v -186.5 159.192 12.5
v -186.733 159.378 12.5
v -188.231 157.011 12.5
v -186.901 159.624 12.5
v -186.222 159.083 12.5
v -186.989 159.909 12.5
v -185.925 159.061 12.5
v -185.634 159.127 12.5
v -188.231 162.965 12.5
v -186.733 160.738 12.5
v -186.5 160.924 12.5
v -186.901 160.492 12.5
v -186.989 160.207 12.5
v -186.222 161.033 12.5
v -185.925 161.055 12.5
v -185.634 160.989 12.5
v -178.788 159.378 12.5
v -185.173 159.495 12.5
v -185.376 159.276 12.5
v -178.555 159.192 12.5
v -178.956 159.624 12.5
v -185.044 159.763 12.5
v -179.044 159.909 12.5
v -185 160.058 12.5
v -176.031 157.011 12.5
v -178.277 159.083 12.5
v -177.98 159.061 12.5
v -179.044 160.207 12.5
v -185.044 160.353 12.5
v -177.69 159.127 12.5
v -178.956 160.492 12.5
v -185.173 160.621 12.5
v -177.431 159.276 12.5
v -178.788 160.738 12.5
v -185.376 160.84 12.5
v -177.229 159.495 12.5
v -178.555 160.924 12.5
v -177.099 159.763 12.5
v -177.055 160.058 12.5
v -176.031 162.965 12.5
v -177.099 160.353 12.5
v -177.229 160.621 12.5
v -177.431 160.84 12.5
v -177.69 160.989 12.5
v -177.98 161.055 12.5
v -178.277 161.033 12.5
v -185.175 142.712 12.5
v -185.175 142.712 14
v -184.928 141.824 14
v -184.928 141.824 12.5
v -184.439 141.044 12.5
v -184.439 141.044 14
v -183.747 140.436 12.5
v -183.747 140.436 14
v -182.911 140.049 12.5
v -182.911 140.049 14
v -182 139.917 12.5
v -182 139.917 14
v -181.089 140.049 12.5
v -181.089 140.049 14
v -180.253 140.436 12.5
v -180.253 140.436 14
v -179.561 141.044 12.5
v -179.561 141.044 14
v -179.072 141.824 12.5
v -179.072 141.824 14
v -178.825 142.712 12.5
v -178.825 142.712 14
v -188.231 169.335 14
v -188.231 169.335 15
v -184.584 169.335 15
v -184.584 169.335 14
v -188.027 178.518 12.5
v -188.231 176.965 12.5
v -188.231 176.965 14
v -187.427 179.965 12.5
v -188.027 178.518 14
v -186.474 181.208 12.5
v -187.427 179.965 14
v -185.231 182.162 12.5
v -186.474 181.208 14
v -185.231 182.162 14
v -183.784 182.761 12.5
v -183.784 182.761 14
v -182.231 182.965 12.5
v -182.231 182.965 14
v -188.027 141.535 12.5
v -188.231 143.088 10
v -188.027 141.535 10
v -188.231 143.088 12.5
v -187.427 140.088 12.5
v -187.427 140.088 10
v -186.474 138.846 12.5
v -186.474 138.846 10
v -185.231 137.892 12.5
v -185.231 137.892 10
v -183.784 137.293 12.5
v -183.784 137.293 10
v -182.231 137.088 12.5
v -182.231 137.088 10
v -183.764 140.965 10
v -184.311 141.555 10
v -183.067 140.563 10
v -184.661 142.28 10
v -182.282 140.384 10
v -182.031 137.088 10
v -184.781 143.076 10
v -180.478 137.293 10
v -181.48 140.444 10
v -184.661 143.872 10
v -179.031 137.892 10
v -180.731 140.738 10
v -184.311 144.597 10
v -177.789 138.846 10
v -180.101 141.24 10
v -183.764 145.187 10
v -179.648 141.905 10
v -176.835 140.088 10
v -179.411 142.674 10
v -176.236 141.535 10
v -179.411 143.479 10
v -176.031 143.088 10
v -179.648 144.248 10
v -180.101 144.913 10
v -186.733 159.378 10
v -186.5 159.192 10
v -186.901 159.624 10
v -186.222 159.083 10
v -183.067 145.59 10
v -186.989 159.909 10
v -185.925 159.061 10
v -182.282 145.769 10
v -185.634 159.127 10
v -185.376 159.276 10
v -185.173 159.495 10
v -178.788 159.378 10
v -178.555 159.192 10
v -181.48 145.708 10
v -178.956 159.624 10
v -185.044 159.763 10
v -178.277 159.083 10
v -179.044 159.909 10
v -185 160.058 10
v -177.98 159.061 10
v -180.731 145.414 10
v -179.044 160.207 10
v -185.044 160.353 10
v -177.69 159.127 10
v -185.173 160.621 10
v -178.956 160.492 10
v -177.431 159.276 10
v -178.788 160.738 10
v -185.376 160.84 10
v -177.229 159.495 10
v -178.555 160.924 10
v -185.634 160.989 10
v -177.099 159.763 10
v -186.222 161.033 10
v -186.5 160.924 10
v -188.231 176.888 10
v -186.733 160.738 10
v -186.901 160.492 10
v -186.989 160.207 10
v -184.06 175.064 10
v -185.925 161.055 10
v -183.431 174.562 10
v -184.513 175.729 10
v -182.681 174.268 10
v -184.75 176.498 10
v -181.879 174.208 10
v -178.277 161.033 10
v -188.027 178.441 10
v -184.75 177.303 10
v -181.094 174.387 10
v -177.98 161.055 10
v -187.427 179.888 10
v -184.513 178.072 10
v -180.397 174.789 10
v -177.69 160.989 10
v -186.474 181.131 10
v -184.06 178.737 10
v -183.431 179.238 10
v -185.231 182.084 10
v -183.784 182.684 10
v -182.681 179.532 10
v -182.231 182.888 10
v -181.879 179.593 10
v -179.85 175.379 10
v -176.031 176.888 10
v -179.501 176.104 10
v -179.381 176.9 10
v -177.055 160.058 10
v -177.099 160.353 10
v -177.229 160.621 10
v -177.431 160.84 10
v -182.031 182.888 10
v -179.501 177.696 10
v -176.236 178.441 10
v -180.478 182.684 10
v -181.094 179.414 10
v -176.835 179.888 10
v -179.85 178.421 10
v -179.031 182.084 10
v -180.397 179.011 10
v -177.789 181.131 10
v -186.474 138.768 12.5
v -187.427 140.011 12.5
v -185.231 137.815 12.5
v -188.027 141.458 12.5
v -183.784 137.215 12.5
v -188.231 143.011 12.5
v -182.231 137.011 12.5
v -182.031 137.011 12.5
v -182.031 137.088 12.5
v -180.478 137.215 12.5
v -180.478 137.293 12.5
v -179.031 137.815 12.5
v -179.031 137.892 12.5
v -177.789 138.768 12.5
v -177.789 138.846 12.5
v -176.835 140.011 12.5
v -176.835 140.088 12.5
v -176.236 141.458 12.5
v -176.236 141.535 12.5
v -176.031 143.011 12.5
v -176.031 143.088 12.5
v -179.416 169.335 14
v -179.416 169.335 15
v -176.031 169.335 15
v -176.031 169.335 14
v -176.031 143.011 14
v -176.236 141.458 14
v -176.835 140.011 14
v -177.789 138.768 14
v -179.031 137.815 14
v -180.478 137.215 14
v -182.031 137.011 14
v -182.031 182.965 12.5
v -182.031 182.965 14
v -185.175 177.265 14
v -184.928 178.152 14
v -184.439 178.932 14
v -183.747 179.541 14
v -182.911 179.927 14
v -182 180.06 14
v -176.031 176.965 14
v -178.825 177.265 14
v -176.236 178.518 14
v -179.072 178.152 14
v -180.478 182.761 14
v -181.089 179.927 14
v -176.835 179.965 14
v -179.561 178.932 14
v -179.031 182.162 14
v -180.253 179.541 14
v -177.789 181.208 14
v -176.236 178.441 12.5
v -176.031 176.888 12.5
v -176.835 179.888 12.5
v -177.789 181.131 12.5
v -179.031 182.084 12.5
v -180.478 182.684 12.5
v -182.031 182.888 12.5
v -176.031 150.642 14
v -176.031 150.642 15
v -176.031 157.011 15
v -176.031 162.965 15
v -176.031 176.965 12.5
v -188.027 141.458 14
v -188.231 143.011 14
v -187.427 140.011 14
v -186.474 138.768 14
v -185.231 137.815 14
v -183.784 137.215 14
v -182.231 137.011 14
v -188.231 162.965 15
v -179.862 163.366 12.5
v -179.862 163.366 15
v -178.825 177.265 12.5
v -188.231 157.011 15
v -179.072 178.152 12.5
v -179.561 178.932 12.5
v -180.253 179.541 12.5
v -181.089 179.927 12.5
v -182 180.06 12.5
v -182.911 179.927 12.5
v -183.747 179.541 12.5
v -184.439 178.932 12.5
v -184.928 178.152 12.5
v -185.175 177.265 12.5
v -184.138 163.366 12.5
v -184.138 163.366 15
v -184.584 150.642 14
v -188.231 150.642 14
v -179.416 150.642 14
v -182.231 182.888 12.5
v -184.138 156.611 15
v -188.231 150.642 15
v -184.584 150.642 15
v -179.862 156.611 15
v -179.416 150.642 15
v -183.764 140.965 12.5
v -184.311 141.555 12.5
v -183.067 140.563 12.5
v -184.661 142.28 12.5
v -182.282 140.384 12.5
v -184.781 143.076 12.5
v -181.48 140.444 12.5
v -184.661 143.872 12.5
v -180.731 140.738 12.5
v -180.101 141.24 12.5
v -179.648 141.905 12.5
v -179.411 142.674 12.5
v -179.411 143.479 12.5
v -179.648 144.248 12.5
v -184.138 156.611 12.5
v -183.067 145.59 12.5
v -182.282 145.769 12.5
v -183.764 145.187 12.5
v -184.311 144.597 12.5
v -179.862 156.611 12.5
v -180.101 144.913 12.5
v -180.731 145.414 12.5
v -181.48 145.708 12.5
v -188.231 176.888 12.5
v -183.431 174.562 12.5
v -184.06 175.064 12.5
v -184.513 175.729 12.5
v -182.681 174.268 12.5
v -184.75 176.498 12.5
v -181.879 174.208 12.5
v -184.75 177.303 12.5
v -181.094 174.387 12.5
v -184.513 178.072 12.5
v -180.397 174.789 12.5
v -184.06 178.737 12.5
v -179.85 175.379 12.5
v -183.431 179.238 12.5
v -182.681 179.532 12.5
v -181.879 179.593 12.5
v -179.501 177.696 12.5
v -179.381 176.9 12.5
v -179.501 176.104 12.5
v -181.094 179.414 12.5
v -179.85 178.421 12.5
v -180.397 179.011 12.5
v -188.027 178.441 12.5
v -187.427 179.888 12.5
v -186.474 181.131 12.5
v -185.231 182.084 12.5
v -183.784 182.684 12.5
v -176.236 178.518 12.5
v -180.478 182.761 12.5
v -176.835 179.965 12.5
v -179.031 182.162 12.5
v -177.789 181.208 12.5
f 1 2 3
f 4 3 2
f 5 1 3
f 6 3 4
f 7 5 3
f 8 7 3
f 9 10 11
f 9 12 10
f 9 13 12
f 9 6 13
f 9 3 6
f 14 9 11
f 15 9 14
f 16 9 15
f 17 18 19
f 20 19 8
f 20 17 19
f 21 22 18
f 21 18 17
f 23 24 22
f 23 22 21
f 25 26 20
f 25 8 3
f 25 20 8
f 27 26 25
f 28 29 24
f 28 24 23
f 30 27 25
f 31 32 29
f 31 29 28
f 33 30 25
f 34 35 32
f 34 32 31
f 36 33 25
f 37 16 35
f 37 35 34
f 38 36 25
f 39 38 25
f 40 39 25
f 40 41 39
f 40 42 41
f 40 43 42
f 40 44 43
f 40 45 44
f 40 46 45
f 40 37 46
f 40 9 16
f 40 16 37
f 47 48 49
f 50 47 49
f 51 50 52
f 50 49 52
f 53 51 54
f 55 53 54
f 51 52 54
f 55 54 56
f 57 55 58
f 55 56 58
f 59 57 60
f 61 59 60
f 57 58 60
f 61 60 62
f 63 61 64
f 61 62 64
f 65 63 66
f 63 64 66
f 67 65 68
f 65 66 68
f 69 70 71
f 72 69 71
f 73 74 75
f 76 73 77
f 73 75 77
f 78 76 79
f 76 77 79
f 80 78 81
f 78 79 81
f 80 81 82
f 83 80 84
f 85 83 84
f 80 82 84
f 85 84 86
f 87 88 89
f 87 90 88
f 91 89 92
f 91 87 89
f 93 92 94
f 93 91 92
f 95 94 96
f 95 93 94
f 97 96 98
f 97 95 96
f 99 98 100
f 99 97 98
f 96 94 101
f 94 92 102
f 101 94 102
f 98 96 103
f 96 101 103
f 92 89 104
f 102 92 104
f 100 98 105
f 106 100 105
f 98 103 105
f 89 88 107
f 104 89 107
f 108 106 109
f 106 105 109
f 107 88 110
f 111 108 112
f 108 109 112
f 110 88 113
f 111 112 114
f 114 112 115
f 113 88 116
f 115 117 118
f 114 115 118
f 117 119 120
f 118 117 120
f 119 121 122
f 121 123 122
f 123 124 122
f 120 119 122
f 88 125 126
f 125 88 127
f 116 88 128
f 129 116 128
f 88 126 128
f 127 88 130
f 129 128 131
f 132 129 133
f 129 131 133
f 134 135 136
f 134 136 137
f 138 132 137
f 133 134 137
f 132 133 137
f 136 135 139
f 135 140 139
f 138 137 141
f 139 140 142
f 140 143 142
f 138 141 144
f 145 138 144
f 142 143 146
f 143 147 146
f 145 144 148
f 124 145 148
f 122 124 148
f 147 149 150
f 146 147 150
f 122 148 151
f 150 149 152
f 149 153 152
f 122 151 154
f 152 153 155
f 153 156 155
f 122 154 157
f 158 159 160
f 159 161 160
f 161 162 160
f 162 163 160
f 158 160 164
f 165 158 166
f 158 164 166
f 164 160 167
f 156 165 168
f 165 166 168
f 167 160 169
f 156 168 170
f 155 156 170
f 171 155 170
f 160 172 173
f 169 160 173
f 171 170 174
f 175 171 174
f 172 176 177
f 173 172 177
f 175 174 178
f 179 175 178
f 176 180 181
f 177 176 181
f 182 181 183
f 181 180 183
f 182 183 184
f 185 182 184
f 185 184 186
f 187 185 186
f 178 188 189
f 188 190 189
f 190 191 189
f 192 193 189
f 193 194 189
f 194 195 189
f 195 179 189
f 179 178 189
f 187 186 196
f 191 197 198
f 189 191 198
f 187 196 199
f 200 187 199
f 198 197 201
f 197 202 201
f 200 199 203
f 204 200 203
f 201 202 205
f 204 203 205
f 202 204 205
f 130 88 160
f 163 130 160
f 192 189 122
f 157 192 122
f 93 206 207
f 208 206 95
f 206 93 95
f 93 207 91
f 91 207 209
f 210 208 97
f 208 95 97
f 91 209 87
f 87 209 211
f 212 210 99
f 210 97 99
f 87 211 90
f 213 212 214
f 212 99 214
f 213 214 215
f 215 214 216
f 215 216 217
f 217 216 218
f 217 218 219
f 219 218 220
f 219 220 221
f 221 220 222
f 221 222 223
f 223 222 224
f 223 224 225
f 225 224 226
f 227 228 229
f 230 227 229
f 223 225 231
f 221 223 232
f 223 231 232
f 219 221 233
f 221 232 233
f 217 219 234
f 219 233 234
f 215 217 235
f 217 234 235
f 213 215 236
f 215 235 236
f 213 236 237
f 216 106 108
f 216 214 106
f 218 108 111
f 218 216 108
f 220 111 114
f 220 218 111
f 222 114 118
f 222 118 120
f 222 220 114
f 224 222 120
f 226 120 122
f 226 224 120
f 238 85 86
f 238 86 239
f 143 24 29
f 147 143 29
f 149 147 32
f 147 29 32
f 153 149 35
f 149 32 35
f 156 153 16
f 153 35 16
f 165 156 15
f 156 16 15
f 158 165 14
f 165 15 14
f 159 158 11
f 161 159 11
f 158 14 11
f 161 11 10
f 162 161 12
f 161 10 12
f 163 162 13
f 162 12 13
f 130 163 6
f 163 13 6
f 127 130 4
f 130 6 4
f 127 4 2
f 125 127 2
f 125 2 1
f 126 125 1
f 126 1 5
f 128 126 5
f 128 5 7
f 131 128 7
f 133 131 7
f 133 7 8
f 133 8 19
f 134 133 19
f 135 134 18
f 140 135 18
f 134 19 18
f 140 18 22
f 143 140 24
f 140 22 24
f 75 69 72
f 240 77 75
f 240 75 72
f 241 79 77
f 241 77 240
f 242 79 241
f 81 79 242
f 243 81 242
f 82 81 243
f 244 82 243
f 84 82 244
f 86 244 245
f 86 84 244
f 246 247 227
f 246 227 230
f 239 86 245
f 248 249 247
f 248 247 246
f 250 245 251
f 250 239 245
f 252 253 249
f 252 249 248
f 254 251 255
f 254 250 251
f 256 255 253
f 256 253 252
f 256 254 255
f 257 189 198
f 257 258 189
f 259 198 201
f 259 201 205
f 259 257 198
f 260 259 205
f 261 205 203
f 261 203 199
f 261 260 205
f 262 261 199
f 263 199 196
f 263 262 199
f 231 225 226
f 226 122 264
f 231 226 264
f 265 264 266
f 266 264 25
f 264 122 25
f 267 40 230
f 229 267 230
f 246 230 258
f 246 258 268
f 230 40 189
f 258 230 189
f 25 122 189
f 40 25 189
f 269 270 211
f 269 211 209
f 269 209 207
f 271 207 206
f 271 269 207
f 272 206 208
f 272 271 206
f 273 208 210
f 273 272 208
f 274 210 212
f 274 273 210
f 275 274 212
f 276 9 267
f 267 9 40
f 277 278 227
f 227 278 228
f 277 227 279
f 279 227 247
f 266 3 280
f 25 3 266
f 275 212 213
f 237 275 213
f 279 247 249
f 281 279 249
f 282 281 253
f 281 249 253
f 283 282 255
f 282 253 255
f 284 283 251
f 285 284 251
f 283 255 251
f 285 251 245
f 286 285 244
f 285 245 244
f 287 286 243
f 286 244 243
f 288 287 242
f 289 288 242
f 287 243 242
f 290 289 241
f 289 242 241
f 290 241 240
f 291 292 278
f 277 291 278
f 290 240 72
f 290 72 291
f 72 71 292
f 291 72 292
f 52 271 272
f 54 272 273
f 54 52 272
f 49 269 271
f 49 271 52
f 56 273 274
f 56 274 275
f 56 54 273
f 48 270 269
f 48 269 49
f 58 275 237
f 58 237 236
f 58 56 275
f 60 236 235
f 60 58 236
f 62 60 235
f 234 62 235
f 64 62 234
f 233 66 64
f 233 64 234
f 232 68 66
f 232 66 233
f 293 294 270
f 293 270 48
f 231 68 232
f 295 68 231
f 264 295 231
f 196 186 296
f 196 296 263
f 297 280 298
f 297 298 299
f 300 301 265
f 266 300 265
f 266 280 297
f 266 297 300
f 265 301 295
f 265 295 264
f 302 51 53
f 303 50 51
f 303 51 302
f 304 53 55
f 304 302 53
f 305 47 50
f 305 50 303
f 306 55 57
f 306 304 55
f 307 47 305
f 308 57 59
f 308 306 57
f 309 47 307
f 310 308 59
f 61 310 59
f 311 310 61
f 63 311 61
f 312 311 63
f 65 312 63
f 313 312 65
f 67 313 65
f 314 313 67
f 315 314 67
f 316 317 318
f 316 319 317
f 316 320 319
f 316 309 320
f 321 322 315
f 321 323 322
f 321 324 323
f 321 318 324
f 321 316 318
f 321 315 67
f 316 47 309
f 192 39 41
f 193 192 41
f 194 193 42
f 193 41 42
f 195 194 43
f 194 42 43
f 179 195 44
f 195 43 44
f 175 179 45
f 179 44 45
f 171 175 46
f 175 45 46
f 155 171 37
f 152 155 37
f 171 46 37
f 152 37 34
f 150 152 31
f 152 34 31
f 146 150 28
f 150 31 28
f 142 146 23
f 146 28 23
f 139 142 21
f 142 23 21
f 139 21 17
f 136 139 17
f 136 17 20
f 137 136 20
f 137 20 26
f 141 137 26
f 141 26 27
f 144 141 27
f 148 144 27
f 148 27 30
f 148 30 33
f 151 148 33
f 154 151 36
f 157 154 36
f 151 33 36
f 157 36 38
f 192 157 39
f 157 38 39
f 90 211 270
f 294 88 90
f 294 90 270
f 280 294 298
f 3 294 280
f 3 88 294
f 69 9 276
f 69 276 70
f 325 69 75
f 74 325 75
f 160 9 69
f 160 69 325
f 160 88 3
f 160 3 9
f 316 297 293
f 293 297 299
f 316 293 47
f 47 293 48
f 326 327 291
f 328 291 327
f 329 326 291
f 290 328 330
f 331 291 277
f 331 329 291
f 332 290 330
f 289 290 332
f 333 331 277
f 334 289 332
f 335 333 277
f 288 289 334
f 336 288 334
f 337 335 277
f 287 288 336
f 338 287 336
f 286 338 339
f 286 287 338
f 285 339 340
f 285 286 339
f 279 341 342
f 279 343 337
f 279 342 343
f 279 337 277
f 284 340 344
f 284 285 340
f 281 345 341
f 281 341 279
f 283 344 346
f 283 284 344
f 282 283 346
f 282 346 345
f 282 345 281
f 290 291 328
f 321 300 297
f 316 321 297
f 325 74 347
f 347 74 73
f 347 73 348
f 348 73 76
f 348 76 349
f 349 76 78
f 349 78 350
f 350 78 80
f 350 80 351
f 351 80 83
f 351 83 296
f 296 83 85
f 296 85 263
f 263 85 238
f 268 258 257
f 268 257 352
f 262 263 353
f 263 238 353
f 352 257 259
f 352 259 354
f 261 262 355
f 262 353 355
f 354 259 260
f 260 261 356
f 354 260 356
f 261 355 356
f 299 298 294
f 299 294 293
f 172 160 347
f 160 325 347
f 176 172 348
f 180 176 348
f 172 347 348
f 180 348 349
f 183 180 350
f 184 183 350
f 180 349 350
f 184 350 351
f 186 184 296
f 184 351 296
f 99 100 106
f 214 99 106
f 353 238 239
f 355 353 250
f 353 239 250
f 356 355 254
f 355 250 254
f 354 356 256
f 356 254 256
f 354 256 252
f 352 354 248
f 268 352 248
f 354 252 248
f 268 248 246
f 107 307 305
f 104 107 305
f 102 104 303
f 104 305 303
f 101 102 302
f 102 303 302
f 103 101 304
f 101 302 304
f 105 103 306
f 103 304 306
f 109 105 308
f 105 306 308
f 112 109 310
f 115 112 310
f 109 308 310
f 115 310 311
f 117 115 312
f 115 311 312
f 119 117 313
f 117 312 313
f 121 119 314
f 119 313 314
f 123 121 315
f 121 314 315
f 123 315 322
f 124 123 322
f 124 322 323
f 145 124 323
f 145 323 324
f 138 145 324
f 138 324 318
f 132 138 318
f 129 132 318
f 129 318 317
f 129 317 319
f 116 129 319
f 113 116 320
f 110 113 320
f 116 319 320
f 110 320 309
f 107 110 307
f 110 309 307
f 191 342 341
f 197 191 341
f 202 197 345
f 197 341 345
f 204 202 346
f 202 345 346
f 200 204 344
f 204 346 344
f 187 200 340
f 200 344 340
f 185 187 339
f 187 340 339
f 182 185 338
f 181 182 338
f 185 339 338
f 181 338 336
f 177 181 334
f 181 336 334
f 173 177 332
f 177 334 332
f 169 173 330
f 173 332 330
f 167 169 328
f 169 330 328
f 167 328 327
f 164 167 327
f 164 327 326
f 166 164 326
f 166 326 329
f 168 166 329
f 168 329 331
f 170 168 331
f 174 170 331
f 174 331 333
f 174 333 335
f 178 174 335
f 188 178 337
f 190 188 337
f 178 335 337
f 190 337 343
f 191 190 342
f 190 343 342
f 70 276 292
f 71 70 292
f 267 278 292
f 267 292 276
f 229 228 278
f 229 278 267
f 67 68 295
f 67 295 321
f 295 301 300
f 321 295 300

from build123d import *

# Parameters (mm, degrees)
SKETCH1_W           = 12.2
SKETCH1_H           = 45.8
BOSS_EXTRUDE1_DEPTH = 2.5
FILLET1_R           = 6
SKETCH2_W           = 12.2
SKETCH2_H           = 20
BOSS_EXTRUDE2_DEPTH = 2.5
FILLET2_R           = 6
SKETCH3_R           = 1
CUT_EXTRUDE1_DEPTH  = 2.5
CUT_EXTRUDE2_DEPTH  = 2.5
SKETCH5_R           = 2.7
CUT_EXTRUDE3_DEPTH  = 2.5
SKETCH6_W           = 13.581434372
SKETCH6_H           = 14.584829414
CUT_EXTRUDE4_DEPTH  = 1


with BuildPart() as part:
    # Sketch1 → Boss-Extrude1 (new body)
    with BuildSketch(Plane.XY.offset(10)):
        with Locations((-182.131179691, 159.988166791)):
            Rectangle(SKETCH1_W, SKETCH1_H)
    extrude(amount=BOSS_EXTRUDE1_DEPTH)

    # Fillet1
    fillet1_edges = [part.edges().sort_by_distance(p)[0] for p in [
        (-188.231179691, 182.888166791, 11.25),
        (-176.031179691, 182.888166791, 11.25),
        (-176.031179691, 137.088166791, 11.25),
        (-188.231179691, 137.088166791, 11.25),
    ]]
    fillet(fillet1_edges, radius=FILLET1_R)

    # Sketch2 → Boss-Extrude2 (add)
    with BuildSketch(Plane.XY.offset(12.5)):
        with Locations((-182.131179691, 172.965455297)):
            Rectangle(SKETCH2_W, SKETCH2_H)
        with Locations((-182.131179691, 147.010878284)):
            Rectangle(SKETCH2_W, SKETCH2_H)
    extrude(amount=BOSS_EXTRUDE2_DEPTH)

    # Fillet2
    fillet2_edges = [part.edges().sort_by_distance(p)[0] for p in [
        (-176.031179691, 182.965455297, 13.75),
        (-188.231179691, 182.965455297, 13.75),
        (-176.031179691, 137.010878284, 13.75),
        (-188.231179691, 137.010878284, 13.75),
    ]]
    fillet(fillet2_edges, radius=FILLET2_R)

    # Sketch3 → Cut-Extrude1 (cut)
    with BuildSketch(Plane.XY.offset(12.5)):
        with Locations((-185.999682024, 160.057912714)):
            Circle(SKETCH3_R)
        with Locations((-178.054871456, 160.057912714)):
            Circle(SKETCH3_R)
    extrude(amount=-CUT_EXTRUDE1_DEPTH, mode=Mode.SUBTRACT)

    # Sketch4 → Cut-Extrude2 (cut)
    with BuildSketch(Plane.XY.offset(15)):
        with BuildLine():
            Line((-184.138427734, 163.365707397), (-179.861572266, 163.365707397))
            Line((-179.861572266, 163.365707397), (-178.824890137, 177.264755249))
            ThreePointArc((-178.824890137, 177.264755249), (-182, 180.059517658), (-185.175109863, 177.264755249))
            Line((-185.175109863, 177.264755249), (-184.138427734, 163.365707397))
        make_face()
        with BuildLine():
            Line((-184.138427734, 156.610626184), (-185.175109863, 142.711578332))
            ThreePointArc((-185.175109863, 142.711578332), (-182, 139.916815923), (-178.824890137, 142.711578332))
            Line((-178.824890137, 142.711578332), (-179.861572266, 156.610626184))
            Line((-179.861572266, 156.610626184), (-184.138427734, 156.610626184))
        make_face()
    extrude(amount=-CUT_EXTRUDE2_DEPTH, mode=Mode.SUBTRACT)

    # Sketch5 → Cut-Extrude3 (cut)
    with BuildSketch(Plane.XY.offset(12.5)):
        with Locations((-182.080577922, 176.90016829)):
            Circle(SKETCH5_R)
        with Locations(Location((-182.080577922, 143.076165291, 0), (0, 0, 180))):
            Circle(SKETCH5_R)
    extrude(amount=-CUT_EXTRUDE3_DEPTH, mode=Mode.SUBTRACT)

    # Sketch6 → Cut-Extrude4 (cut)
    with BuildSketch(Plane.XY.offset(15)):
        with Locations((-182.821896877, 176.627084813)):
            Rectangle(SKETCH6_W, SKETCH6_H)
        with Locations((-182.821896877, 143.349248768)):
            Rectangle(SKETCH6_W, SKETCH6_H)
    extrude(amount=-CUT_EXTRUDE4_DEPTH, mode=Mode.SUBTRACT)


solid = part.part
